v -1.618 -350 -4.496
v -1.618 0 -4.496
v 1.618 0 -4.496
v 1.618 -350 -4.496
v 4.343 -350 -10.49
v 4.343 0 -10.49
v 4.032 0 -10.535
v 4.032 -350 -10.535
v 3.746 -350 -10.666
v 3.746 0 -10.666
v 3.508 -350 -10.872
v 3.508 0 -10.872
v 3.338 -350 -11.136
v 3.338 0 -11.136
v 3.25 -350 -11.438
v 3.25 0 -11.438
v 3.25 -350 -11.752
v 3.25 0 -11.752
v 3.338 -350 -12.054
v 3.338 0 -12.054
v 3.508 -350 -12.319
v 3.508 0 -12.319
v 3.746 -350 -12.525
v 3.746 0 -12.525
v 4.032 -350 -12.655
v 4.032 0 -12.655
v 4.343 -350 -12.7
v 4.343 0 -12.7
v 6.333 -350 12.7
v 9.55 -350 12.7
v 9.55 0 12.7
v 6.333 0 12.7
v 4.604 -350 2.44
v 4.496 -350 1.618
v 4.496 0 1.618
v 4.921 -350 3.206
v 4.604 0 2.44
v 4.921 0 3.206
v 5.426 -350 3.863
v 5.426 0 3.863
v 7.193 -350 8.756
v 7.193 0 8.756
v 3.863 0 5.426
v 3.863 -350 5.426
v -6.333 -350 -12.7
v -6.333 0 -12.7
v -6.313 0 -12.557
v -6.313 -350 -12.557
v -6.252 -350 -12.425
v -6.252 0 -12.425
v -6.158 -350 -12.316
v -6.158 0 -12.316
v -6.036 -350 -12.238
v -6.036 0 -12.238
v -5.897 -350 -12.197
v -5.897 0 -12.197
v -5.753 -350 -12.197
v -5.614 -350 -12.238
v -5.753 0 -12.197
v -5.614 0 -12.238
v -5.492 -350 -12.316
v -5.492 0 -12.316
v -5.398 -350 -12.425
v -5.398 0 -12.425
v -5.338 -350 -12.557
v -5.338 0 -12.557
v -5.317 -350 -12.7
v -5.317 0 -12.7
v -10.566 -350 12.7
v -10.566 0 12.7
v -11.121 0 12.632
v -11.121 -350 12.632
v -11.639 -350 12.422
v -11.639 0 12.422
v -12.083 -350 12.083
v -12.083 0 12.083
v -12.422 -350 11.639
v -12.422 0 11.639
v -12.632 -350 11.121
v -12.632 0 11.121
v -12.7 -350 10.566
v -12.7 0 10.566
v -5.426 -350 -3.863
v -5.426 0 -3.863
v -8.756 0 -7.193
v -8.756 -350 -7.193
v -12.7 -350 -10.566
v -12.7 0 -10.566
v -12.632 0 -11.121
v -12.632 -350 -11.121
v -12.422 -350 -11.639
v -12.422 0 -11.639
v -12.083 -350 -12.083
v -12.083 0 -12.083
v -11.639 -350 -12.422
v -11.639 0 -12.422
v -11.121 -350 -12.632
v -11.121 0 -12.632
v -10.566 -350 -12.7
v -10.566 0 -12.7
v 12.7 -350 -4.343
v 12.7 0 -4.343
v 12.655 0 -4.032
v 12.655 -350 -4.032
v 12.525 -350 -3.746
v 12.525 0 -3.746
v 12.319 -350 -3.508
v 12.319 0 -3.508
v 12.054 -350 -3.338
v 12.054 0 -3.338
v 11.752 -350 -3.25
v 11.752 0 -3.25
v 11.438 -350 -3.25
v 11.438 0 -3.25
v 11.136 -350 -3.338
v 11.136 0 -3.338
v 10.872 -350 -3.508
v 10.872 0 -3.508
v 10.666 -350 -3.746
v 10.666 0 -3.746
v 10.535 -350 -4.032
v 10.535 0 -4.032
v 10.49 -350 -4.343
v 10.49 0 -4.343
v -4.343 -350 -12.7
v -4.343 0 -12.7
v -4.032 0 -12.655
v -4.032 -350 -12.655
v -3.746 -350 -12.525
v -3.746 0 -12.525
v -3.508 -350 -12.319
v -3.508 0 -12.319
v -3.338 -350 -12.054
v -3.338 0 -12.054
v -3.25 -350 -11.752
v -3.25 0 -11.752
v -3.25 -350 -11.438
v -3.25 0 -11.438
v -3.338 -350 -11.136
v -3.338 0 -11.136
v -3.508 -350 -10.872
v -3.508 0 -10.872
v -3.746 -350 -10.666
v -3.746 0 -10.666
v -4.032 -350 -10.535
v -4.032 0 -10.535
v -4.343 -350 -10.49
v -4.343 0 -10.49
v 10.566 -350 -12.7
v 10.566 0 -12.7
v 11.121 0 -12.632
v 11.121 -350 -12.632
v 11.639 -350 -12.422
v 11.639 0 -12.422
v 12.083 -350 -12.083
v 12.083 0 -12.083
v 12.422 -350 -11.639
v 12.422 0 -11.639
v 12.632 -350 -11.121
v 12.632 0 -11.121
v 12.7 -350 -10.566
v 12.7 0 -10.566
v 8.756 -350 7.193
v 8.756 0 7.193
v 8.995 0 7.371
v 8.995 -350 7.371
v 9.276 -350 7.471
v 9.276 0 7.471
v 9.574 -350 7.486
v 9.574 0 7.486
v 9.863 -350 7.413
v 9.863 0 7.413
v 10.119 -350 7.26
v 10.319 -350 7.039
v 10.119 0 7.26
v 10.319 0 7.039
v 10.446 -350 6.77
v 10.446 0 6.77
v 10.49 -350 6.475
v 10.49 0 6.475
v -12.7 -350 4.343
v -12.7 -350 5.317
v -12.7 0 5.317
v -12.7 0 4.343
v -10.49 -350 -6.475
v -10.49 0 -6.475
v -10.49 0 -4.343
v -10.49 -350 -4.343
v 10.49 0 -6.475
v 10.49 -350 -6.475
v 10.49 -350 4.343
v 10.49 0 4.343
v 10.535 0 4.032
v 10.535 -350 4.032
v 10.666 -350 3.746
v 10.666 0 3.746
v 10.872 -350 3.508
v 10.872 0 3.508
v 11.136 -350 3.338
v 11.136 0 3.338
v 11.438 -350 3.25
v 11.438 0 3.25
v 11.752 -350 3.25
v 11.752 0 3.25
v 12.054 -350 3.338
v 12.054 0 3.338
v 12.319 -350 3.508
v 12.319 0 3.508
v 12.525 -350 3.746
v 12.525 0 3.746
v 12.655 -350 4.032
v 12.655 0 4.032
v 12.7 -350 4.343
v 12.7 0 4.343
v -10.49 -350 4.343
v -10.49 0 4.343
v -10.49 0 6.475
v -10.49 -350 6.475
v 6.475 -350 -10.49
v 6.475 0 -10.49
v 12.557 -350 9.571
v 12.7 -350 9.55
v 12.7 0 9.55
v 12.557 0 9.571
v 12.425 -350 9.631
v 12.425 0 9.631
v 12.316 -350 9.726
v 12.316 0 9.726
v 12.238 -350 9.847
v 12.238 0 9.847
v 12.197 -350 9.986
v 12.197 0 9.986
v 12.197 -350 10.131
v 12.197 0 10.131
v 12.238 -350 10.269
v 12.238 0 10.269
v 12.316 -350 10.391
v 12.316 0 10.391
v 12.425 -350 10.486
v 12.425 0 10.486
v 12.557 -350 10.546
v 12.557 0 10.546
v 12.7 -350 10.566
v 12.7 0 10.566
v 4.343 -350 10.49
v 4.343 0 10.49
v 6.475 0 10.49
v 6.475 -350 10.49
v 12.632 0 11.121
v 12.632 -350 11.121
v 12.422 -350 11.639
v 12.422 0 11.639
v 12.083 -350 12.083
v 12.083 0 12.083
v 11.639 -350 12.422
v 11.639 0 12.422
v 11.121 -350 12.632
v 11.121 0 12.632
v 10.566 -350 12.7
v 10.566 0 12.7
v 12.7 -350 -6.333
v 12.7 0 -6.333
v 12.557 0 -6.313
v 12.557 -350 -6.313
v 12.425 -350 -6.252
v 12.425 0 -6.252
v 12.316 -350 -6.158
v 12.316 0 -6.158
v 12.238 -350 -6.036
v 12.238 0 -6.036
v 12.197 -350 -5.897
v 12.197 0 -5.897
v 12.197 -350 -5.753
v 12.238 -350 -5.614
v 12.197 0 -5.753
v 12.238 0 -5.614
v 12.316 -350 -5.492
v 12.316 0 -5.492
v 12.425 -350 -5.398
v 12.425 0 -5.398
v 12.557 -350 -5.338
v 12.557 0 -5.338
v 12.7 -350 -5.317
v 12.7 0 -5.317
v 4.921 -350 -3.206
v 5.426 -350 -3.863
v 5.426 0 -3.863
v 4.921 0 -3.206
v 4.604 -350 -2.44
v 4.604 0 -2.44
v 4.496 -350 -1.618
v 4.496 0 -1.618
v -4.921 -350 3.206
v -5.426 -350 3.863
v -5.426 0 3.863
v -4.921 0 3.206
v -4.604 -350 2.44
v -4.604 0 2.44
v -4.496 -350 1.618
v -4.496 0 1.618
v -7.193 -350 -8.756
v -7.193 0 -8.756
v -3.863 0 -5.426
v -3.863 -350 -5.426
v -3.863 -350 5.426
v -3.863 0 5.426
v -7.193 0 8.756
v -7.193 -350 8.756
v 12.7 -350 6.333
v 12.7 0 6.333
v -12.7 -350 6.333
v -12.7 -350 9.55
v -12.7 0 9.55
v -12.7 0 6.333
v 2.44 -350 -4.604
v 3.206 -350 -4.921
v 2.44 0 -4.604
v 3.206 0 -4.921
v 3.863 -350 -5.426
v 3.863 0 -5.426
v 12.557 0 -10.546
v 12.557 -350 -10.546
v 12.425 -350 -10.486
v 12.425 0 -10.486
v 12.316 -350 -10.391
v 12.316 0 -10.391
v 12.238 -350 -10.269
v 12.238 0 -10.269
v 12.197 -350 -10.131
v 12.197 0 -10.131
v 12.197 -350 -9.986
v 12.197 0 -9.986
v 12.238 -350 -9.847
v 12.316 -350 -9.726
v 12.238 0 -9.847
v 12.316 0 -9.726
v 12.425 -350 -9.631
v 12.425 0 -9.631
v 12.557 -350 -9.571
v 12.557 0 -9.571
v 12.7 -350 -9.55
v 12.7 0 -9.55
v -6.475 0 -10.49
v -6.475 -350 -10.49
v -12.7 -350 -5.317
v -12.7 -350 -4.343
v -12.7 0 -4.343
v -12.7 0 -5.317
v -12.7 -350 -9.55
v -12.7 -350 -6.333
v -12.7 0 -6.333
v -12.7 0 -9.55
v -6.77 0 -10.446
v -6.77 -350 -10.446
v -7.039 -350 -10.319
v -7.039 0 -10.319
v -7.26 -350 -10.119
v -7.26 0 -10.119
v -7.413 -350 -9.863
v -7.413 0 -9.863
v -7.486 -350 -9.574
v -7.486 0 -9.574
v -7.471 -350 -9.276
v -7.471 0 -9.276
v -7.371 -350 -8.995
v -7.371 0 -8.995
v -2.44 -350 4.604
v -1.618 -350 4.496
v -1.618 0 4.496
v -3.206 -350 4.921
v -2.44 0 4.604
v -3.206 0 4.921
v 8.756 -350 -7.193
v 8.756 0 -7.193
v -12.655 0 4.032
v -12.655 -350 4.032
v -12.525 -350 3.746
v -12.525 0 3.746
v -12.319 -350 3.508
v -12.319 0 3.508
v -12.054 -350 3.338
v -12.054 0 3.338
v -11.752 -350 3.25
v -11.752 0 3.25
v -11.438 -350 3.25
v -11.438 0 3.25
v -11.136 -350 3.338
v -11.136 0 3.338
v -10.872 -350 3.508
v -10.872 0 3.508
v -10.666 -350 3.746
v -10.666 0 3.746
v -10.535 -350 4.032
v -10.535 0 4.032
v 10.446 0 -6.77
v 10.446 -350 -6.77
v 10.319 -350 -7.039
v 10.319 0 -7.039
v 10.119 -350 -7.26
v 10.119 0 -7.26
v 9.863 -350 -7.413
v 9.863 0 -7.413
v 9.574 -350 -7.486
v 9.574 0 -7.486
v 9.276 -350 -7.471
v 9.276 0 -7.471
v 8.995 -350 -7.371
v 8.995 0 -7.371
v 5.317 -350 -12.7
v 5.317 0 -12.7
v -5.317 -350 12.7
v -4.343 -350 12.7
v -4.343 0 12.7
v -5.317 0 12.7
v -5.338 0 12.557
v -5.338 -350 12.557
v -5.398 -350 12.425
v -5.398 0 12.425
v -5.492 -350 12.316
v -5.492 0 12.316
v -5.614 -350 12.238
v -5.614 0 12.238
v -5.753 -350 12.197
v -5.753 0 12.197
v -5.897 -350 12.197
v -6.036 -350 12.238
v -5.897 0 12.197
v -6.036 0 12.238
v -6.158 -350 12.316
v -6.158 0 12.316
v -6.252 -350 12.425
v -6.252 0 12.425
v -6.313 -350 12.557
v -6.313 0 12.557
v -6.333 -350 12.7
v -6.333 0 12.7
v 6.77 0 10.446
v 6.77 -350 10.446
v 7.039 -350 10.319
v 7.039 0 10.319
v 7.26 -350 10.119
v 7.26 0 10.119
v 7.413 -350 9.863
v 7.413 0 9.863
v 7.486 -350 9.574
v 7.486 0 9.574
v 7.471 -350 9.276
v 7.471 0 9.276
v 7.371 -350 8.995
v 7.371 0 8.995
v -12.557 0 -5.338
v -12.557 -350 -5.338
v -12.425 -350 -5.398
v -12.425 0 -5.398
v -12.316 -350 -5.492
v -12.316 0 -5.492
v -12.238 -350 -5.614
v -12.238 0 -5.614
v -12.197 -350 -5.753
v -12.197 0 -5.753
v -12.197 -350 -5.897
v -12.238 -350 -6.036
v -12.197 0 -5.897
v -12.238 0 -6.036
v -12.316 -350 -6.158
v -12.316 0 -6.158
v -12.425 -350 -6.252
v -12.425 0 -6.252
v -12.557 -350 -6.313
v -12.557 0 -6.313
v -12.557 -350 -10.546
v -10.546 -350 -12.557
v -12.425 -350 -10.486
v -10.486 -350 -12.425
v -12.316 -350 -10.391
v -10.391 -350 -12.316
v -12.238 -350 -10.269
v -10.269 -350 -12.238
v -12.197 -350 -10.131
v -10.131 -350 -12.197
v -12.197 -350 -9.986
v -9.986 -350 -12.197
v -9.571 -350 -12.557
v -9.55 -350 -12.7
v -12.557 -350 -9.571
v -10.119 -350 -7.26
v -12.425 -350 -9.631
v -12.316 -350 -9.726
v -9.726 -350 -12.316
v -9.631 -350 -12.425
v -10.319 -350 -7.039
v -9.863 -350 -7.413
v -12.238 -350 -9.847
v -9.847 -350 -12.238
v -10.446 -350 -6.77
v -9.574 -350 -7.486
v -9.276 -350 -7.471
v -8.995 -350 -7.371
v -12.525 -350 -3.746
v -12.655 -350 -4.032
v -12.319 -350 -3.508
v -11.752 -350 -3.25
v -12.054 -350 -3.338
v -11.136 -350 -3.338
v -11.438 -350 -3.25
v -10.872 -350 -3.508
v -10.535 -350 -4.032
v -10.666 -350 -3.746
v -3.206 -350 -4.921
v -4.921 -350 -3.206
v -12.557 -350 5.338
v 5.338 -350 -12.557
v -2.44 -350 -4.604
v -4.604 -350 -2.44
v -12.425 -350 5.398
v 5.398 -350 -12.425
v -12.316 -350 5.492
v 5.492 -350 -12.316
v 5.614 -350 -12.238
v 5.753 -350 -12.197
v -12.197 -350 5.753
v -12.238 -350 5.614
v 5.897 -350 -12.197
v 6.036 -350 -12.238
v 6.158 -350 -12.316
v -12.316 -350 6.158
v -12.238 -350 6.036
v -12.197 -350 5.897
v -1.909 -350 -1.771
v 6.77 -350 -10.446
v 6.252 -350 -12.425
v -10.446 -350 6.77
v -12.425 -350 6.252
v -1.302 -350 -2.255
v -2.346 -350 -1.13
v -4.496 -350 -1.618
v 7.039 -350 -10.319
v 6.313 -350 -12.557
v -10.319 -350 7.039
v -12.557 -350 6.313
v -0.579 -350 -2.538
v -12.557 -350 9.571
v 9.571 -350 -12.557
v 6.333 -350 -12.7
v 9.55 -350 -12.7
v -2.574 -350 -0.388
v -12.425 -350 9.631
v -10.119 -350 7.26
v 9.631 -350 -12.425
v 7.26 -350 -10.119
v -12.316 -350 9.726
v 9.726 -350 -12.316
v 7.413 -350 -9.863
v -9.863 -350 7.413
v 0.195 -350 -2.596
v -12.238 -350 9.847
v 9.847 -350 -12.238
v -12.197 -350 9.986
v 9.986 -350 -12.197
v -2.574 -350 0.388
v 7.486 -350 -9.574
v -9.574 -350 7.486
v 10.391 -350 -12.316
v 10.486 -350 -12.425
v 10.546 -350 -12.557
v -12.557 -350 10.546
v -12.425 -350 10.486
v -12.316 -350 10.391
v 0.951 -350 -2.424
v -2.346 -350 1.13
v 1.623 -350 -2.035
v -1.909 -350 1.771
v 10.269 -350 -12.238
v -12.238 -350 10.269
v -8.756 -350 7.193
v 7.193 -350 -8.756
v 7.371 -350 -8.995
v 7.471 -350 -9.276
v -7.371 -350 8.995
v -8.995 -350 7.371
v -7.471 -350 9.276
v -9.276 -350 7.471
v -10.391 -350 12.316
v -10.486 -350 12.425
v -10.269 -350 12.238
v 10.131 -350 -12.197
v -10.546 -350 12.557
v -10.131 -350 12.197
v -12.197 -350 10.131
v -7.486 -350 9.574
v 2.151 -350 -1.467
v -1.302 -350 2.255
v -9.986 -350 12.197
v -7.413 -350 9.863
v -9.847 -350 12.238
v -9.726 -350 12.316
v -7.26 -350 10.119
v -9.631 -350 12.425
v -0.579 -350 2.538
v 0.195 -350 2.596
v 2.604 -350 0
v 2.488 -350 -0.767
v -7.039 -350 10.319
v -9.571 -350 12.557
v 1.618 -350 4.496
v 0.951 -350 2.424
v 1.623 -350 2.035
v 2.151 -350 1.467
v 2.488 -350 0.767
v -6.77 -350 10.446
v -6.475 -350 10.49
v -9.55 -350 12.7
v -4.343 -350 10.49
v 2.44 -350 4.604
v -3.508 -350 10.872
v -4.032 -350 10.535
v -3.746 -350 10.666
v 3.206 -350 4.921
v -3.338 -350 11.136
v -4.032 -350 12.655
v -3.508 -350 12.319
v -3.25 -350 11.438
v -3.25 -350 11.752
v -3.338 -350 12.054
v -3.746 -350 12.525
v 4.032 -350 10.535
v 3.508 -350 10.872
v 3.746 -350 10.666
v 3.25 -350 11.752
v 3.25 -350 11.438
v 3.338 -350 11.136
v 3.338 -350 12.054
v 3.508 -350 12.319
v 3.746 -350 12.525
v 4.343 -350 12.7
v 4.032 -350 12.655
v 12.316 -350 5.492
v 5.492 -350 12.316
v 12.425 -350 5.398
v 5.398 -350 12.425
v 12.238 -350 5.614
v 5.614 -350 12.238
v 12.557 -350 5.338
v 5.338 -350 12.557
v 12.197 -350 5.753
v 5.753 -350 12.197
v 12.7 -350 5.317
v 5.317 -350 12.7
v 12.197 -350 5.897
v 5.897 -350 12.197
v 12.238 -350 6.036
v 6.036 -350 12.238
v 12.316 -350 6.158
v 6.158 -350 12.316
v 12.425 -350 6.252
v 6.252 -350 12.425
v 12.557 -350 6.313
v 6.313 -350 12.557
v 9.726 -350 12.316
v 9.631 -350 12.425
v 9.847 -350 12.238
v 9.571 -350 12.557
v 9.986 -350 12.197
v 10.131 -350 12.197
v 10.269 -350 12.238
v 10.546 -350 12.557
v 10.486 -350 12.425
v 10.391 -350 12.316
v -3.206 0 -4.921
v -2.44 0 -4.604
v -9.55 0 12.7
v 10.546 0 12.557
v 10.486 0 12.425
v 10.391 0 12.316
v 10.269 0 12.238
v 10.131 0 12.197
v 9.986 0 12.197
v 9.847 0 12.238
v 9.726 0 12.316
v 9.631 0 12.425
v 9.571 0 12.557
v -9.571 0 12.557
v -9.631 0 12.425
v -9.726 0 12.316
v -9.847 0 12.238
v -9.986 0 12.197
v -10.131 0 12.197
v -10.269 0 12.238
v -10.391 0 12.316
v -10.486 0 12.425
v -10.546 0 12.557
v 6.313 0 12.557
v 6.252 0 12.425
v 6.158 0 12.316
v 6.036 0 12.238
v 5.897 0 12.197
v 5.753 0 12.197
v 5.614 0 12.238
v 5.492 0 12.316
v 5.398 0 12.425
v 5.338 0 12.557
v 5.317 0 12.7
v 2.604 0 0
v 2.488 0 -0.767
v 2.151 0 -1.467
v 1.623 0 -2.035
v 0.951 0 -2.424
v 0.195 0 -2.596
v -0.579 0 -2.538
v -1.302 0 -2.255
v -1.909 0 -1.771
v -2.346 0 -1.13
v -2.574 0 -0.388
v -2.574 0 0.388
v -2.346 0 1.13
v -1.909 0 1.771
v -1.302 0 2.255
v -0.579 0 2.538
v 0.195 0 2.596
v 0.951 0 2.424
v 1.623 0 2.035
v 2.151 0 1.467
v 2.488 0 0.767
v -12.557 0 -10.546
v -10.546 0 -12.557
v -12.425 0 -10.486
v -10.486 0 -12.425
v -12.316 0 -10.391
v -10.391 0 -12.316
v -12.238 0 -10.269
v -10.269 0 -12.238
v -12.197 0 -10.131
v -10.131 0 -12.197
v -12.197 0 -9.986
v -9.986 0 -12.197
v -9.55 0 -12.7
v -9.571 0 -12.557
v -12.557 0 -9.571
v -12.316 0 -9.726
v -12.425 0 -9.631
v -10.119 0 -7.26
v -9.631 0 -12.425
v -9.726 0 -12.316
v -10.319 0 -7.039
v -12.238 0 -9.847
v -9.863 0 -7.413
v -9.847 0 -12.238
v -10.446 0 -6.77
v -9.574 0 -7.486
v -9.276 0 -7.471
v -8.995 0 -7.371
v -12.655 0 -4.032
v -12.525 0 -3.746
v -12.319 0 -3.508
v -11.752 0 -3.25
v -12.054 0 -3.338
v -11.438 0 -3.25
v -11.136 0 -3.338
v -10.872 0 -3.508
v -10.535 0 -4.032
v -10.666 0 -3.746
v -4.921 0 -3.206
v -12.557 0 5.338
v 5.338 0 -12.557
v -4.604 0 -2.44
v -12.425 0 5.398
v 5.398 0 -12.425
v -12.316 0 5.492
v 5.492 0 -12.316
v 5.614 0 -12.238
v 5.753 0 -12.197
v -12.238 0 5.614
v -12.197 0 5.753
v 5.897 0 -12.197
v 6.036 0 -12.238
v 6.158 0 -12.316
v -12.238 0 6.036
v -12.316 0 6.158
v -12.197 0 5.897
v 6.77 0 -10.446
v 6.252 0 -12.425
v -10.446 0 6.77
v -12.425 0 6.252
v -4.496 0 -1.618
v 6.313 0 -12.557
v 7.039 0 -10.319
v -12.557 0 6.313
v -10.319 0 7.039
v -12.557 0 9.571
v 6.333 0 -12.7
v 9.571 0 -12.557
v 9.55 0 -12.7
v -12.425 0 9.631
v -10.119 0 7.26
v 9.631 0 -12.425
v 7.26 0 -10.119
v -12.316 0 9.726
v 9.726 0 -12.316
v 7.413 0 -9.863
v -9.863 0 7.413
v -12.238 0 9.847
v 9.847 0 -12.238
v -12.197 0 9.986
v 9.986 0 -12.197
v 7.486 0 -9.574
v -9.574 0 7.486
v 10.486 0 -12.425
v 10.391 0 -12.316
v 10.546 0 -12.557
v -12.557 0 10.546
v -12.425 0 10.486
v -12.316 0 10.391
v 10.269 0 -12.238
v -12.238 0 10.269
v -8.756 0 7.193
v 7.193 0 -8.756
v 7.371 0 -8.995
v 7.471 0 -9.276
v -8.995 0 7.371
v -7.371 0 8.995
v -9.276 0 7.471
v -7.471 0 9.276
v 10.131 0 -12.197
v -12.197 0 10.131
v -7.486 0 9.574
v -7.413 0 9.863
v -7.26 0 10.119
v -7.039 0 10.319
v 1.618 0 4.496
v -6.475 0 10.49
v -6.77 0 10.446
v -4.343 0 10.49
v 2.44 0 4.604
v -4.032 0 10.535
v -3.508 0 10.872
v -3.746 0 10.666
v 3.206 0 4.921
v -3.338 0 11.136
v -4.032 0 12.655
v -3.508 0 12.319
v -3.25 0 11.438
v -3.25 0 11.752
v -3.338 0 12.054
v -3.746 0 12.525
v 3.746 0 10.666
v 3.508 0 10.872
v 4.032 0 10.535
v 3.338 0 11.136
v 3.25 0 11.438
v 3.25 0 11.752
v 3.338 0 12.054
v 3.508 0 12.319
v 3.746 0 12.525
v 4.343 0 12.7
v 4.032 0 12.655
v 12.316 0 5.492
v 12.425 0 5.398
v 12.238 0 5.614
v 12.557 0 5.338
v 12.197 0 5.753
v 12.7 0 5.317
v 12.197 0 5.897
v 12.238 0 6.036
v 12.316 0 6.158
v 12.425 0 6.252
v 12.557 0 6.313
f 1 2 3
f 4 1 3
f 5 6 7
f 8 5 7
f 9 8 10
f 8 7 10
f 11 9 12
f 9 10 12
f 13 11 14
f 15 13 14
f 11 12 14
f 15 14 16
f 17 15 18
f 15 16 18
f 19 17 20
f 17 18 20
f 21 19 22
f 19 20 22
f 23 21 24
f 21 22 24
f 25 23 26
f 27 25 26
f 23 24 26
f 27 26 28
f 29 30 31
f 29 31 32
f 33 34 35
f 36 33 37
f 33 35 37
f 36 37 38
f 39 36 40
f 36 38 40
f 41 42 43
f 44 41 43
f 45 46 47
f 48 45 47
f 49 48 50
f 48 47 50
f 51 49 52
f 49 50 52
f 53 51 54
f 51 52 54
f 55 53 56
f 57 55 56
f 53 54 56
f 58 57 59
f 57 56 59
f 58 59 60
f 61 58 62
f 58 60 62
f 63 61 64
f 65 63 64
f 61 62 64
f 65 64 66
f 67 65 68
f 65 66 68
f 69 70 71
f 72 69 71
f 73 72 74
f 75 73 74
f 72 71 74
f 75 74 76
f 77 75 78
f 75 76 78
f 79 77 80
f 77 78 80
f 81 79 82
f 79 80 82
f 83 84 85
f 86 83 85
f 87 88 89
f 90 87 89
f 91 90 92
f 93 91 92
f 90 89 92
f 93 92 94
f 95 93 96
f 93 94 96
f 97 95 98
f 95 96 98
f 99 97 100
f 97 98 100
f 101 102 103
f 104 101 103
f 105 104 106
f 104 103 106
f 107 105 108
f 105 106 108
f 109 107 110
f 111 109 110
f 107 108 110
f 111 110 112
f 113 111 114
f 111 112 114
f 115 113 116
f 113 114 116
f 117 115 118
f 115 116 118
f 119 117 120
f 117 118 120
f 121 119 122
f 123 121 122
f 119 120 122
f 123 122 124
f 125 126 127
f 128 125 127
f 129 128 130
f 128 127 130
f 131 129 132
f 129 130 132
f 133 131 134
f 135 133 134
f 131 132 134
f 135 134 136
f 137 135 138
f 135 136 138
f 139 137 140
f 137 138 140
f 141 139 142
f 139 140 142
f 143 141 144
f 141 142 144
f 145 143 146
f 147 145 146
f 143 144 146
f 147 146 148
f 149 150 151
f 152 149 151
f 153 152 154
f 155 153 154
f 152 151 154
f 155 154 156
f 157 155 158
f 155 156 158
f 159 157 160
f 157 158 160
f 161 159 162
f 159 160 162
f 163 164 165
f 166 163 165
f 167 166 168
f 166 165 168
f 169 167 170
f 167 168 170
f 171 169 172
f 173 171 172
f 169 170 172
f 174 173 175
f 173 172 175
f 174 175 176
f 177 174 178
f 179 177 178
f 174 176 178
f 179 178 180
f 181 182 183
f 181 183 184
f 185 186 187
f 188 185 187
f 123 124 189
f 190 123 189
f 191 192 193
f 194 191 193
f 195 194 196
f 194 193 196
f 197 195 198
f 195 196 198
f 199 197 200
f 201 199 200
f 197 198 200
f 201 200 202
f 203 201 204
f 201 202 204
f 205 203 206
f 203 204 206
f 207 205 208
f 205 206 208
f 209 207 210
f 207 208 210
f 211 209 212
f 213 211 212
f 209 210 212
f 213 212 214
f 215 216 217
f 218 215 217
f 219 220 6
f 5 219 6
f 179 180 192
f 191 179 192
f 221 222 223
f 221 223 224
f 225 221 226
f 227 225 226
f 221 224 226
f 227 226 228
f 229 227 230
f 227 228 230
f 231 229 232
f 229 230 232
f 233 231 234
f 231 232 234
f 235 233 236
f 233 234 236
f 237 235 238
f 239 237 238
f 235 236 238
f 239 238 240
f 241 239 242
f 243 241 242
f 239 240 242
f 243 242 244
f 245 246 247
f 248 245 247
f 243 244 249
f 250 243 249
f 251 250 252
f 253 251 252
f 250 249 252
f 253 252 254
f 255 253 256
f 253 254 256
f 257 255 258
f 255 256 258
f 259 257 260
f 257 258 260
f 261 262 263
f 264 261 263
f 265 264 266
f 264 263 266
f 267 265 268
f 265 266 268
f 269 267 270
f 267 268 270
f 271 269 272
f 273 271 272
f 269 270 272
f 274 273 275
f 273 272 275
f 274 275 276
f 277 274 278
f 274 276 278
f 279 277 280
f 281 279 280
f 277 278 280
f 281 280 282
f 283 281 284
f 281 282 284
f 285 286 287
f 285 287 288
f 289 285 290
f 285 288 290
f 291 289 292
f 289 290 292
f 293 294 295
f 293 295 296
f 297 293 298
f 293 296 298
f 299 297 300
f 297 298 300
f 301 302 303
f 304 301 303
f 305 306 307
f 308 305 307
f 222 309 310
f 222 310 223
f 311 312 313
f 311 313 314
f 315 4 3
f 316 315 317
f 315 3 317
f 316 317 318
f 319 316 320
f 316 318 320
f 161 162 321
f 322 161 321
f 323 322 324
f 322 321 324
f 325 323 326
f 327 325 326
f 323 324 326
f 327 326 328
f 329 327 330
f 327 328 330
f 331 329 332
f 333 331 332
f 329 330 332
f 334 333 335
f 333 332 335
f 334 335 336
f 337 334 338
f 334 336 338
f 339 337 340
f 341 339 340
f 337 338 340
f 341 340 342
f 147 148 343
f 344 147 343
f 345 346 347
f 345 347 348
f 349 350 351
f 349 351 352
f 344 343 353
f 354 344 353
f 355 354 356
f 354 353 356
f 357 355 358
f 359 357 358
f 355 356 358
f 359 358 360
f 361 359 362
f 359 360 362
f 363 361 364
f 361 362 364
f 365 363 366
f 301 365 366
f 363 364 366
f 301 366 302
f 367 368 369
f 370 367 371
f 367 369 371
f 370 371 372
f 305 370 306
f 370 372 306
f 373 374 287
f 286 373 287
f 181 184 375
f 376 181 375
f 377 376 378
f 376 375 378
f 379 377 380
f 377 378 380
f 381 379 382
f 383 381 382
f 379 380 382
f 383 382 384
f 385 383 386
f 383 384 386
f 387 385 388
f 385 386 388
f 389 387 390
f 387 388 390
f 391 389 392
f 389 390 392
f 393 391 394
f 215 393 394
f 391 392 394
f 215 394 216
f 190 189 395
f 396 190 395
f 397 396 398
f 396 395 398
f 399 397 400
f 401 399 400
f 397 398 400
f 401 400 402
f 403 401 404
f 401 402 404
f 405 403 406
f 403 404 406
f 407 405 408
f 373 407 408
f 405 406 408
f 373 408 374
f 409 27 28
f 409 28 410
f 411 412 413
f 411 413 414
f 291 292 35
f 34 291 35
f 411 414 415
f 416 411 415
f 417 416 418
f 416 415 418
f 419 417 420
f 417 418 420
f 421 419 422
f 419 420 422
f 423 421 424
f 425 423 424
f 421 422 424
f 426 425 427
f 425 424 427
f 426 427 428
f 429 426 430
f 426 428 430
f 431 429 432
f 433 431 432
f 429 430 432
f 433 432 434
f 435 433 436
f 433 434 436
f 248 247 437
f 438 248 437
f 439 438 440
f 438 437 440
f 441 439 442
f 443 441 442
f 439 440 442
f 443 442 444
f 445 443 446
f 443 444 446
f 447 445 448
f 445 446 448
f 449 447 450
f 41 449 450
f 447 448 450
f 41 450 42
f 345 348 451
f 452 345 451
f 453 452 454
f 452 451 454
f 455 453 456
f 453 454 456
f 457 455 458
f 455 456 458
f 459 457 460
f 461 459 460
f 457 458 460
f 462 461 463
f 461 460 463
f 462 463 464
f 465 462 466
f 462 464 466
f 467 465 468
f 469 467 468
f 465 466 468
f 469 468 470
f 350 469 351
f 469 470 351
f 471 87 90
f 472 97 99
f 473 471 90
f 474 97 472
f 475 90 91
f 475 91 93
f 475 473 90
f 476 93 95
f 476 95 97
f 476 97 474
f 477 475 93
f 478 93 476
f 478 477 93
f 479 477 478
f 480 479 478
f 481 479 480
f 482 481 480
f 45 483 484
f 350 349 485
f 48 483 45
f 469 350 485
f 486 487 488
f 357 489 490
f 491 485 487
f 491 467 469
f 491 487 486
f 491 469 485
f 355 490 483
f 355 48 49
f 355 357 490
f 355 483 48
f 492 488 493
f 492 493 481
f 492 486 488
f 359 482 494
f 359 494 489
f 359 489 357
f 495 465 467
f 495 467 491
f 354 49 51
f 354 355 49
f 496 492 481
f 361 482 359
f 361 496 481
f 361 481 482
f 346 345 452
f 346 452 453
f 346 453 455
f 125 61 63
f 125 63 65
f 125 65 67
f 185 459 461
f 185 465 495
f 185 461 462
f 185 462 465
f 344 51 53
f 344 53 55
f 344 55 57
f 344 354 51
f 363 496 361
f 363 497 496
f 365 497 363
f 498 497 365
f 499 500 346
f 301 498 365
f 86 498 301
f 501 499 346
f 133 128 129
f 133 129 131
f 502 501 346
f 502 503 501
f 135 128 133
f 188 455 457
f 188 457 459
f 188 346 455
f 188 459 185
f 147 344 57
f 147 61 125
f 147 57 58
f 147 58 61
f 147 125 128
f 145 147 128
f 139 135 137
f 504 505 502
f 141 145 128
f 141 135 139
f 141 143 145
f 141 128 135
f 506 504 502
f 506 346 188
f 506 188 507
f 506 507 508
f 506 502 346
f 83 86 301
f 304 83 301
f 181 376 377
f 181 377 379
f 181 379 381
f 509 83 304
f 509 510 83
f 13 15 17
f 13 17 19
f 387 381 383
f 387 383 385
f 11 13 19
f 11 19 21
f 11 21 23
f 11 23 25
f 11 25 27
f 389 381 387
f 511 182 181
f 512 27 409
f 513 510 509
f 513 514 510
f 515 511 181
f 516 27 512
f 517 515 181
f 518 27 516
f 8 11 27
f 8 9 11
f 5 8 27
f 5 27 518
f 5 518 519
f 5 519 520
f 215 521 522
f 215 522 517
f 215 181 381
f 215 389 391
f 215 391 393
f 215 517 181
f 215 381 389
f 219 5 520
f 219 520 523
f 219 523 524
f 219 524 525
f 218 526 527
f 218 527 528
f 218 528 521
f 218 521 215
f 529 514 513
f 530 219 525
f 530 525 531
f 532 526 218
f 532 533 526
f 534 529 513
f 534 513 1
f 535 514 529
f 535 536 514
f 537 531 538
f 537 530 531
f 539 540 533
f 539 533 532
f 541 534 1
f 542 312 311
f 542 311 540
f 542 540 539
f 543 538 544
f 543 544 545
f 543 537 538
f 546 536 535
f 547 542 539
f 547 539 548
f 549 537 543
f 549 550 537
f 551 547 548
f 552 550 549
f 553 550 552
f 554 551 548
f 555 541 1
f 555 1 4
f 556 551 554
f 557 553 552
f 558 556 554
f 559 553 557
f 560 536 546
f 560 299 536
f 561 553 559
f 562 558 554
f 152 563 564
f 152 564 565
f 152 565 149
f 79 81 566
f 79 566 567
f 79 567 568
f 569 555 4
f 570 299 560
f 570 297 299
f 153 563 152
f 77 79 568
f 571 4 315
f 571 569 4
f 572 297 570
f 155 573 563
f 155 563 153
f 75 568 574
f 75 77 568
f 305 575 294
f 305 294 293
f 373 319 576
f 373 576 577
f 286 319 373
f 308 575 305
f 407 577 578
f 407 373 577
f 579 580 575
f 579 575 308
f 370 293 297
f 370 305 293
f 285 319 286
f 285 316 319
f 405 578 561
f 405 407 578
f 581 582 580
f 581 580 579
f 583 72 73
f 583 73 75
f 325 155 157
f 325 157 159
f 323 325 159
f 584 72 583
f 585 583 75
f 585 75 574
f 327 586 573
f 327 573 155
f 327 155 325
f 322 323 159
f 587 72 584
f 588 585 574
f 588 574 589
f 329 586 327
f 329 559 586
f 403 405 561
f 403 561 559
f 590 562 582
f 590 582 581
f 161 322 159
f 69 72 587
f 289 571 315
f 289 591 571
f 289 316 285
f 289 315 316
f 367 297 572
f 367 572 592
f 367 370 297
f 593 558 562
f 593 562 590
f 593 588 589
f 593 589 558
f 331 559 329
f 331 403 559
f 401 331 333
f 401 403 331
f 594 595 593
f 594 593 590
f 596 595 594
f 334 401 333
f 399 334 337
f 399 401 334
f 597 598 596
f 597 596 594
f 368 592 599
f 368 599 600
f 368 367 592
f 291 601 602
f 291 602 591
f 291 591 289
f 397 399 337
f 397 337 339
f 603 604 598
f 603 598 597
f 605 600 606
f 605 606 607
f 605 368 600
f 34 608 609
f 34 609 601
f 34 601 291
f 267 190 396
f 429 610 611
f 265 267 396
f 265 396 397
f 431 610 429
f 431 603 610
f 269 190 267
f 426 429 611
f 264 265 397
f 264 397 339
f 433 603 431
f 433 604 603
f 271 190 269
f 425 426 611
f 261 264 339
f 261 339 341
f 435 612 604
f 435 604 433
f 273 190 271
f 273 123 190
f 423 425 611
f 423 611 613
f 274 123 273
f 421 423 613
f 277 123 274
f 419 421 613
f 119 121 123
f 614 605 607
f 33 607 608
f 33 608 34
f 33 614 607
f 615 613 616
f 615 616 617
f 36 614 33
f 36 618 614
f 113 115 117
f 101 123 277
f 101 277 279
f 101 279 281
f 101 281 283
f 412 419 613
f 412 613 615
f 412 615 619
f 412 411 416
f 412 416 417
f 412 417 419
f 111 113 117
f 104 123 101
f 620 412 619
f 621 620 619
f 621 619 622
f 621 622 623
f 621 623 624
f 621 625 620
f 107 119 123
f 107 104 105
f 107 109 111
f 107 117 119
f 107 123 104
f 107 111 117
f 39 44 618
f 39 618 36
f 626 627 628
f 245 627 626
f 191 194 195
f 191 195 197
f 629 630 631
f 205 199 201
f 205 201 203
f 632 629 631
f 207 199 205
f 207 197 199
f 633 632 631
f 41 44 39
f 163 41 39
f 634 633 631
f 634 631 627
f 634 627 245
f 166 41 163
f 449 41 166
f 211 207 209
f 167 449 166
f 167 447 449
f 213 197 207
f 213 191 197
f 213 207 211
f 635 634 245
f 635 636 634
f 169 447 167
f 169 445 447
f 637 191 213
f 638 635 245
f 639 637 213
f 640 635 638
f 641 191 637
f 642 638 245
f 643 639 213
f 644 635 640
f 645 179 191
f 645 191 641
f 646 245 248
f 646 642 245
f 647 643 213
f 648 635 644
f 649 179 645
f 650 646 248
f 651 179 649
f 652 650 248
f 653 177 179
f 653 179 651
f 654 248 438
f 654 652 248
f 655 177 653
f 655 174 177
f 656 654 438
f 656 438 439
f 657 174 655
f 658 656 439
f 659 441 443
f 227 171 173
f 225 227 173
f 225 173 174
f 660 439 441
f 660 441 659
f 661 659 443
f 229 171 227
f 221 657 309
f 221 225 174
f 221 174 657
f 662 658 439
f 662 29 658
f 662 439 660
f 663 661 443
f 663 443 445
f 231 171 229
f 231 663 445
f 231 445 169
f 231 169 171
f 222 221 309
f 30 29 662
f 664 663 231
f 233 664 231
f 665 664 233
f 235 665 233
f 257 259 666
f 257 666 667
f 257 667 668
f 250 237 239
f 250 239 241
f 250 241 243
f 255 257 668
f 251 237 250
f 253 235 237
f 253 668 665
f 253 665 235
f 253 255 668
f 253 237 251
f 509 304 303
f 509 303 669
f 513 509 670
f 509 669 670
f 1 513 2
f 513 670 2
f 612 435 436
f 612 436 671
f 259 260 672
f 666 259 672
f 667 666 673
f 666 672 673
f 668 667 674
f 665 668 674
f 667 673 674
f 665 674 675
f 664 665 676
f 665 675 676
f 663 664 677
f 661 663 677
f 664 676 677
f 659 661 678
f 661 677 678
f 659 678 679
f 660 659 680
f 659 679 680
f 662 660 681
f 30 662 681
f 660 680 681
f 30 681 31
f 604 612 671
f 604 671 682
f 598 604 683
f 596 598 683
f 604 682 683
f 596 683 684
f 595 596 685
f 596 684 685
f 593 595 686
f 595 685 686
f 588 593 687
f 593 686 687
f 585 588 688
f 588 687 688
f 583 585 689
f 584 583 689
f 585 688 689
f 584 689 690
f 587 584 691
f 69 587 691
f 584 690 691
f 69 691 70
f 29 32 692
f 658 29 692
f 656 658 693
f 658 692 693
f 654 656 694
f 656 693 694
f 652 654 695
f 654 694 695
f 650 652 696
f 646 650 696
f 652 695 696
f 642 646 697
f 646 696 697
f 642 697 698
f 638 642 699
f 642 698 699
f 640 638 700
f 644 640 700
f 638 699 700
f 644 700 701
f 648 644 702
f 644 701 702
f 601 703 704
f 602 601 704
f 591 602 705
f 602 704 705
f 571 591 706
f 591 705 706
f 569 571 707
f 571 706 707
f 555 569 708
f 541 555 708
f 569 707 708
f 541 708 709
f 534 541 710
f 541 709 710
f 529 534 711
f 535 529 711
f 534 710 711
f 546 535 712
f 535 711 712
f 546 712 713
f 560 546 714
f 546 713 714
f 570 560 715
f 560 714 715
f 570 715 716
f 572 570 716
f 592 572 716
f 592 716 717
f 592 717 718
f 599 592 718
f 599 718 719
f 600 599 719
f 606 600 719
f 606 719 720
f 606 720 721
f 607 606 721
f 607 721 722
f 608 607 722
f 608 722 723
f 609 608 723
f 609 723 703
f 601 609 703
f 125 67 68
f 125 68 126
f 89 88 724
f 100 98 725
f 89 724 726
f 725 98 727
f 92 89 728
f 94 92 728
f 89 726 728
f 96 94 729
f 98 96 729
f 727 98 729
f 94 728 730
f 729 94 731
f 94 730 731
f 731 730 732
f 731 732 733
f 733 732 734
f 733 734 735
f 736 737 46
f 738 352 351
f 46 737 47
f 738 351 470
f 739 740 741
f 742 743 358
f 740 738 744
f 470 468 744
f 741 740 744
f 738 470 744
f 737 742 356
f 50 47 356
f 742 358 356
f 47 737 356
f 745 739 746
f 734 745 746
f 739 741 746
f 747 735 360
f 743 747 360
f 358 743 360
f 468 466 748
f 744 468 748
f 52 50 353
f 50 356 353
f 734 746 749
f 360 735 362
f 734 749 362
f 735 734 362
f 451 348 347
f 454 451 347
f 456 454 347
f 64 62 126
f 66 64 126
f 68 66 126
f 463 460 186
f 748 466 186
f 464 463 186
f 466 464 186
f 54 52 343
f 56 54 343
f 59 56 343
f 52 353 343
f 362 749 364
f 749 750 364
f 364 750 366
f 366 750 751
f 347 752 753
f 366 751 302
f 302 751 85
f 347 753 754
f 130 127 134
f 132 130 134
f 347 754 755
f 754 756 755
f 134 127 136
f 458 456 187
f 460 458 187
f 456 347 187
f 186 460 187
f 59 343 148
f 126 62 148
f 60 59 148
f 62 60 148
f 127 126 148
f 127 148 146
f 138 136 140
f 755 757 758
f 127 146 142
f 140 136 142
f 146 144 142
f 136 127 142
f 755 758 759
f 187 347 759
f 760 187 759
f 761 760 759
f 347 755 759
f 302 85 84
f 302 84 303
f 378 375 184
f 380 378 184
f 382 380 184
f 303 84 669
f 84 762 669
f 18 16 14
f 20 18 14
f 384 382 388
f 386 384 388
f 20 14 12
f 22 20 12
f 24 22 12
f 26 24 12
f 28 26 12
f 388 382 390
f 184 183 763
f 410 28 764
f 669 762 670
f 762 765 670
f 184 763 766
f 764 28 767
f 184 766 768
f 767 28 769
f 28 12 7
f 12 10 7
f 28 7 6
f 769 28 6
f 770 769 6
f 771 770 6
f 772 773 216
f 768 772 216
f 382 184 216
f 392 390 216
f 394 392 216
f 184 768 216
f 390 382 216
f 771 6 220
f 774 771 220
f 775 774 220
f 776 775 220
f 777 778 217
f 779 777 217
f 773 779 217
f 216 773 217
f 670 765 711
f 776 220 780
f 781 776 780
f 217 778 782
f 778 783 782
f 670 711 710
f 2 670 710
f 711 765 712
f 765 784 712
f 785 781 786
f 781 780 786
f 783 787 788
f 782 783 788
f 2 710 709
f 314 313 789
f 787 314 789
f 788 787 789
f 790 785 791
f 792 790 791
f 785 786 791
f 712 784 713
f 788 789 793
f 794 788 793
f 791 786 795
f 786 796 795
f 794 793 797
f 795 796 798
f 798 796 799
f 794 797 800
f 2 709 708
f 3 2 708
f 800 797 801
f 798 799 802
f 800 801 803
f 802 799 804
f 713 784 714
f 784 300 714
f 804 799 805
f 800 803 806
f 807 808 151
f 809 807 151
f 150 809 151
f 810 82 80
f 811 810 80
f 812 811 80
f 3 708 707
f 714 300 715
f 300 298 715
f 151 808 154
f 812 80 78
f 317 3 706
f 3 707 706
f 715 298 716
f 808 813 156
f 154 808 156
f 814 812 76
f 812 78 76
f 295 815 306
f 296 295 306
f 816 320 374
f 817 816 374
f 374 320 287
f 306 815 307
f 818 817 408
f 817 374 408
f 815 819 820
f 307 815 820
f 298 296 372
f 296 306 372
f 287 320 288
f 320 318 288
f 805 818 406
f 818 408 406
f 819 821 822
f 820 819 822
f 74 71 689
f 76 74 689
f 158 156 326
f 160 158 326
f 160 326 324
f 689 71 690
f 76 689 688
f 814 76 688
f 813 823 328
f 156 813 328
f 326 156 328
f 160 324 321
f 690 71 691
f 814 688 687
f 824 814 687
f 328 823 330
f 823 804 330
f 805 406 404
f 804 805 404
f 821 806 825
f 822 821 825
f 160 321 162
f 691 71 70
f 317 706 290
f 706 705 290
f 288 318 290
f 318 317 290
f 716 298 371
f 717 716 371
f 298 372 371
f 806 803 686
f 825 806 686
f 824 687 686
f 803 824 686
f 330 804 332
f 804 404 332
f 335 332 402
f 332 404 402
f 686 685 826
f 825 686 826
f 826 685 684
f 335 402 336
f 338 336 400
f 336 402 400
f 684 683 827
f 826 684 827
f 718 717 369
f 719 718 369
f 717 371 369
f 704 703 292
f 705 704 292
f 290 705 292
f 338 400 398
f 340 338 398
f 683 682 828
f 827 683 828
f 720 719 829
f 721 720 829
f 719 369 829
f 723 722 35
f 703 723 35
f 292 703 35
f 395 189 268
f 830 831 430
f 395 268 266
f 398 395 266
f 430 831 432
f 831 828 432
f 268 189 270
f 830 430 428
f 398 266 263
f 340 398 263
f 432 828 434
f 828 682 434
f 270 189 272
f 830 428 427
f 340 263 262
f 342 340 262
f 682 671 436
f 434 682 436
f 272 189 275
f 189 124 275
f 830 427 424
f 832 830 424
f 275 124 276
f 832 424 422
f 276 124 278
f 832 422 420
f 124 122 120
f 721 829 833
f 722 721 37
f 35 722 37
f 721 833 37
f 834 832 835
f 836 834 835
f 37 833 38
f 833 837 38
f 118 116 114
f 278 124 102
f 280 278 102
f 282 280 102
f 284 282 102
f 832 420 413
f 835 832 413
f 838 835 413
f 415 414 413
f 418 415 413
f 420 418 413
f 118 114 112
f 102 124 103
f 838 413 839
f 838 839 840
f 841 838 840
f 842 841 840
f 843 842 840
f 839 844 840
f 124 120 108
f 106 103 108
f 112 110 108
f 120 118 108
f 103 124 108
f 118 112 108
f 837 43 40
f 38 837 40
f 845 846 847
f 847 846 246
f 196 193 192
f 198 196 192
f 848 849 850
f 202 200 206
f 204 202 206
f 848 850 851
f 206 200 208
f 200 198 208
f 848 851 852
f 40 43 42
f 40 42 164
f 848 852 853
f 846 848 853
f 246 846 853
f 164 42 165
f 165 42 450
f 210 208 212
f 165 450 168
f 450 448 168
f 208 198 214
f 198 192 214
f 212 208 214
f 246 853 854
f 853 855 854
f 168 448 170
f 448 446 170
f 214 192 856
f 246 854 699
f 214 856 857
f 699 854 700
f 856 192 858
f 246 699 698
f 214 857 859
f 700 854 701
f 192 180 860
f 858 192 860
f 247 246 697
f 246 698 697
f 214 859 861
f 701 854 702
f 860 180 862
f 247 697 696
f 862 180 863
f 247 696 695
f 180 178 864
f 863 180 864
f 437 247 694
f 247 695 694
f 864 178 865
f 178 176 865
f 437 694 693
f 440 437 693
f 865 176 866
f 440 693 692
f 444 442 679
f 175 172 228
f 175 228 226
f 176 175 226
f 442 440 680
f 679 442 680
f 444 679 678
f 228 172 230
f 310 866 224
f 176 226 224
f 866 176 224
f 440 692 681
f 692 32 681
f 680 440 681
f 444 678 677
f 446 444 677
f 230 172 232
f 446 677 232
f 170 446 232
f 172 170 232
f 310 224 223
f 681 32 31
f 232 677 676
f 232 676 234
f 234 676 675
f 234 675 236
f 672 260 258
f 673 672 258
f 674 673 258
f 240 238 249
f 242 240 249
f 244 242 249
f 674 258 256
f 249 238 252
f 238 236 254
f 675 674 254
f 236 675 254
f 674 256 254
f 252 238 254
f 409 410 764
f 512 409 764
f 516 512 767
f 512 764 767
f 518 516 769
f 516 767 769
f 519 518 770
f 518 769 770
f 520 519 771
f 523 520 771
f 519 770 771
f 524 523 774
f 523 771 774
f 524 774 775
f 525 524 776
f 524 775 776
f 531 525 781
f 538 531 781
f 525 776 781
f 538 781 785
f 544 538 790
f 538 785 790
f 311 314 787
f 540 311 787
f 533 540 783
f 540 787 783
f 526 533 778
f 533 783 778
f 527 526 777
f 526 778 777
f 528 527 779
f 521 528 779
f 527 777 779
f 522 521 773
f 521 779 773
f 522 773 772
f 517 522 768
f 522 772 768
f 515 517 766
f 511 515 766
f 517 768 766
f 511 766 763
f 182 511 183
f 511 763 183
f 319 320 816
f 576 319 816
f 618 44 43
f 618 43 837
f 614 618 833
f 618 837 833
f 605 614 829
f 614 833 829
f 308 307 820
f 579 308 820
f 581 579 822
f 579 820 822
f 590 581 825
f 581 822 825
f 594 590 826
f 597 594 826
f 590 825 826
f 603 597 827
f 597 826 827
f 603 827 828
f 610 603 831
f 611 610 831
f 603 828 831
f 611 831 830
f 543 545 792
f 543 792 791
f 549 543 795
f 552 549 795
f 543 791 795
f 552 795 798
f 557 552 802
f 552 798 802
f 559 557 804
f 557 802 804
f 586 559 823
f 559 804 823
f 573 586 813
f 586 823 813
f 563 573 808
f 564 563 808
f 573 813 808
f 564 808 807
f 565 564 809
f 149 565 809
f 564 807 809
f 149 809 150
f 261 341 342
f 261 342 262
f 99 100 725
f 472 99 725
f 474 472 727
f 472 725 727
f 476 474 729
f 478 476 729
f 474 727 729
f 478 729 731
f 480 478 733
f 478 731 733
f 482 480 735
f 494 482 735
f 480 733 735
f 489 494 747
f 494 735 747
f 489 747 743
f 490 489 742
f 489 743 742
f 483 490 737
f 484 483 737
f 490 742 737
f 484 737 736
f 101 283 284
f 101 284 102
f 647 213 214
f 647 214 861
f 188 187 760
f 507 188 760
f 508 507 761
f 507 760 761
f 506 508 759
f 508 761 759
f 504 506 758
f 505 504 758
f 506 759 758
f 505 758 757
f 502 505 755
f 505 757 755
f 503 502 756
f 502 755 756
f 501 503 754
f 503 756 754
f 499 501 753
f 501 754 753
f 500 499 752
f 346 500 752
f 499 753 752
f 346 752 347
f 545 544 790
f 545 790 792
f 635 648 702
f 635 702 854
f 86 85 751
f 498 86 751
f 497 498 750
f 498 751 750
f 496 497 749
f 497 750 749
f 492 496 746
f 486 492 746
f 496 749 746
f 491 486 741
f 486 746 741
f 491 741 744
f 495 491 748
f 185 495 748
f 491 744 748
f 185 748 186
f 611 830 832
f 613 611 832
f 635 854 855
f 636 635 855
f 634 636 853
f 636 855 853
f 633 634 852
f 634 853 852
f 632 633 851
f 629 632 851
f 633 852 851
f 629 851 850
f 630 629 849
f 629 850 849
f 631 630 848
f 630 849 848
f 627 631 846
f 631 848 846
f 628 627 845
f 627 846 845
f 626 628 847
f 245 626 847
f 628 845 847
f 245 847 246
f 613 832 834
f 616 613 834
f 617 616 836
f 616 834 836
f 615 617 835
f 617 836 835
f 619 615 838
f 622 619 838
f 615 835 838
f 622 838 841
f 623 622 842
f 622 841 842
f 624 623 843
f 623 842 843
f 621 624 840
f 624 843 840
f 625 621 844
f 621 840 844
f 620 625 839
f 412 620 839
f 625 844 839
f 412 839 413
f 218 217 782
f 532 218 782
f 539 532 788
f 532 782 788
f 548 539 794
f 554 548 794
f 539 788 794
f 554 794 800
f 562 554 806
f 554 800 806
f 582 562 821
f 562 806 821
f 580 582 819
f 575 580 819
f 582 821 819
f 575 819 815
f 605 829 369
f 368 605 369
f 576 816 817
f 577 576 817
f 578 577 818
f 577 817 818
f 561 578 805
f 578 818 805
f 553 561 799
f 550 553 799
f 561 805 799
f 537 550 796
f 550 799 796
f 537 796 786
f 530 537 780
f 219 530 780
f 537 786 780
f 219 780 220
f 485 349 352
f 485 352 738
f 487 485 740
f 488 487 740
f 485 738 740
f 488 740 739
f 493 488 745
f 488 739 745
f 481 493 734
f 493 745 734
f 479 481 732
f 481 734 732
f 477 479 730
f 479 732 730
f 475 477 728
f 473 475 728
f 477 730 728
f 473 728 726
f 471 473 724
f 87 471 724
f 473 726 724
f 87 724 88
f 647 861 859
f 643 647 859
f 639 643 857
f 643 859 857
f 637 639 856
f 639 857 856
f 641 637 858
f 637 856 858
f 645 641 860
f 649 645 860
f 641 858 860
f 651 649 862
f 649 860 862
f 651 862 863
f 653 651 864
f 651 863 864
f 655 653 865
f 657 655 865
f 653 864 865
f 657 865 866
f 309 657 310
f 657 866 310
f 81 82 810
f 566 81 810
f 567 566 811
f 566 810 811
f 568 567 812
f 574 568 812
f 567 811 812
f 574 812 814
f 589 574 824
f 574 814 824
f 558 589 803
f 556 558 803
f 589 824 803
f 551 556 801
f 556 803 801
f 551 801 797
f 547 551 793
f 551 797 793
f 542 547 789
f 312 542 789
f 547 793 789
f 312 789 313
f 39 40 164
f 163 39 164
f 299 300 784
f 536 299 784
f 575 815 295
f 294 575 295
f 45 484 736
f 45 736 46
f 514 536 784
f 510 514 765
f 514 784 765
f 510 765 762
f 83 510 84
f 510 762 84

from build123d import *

# Parameters (mm, degrees)
F1_DEPTH = 375
F2_DEPTH = 25


# Not quite as in the source:
# - ends of sketch curves that miss each other by under 0.0002 mm in the source are joined


with BuildPart() as f1:
    # F0 (on Front) → F1 (new body)
    with BuildSketch(Plane.XZ):
        with BuildLine():
            ThreePointArc((-12.7, -9.5504), (-12.1920000057, -10.0583238), (-12.6998476, -10.5663999771))
            ThreePointArc((-12.6998476, -10.5663999771), (-12.0825225161, -12.0825225161), (-10.5664000074, -12.6998469825))
            ThreePointArc((-10.5664000074, -12.6998469825), (-10.0583238, -12.1920000057), (-9.5504, -12.7))
            Line((-9.5504, -12.7), (-6.3330836, -12.7))
            ThreePointArc((-6.3330836, -12.7), (-5.8250836, -12.192), (-5.3170836, -12.7))
            Line((-5.3170836, -12.7), (-4.3434, -12.7))
            ThreePointArc((-4.3434, -12.7), (-3.2385, -11.5951), (-4.3434, -10.4902))
            Line((-4.3434, -10.4902), (-6.4747902, -10.4902))
            ThreePointArc((-6.4747902, -10.4902), (-7.413451805, -9.8630063673), (-7.1932106897, -8.7557795103))
            Line((-7.1932106897, -8.7557795103), (-3.8631622, -5.4257448))
            ThreePointArc((-3.8631622, -5.4257448), (-2.8331268978, -4.7374824843), (-1.618107, -4.4958))
            Line((-1.618107, -4.4958), (1.618107, -4.4958))
            ThreePointArc((1.618107, -4.4958), (2.8331268978, -4.7374824843), (3.8631710303, -5.4257359697))
            Line((3.8631710303, -5.4257359697), (7.1932038, -8.7557864))
            ThreePointArc((7.1932038, -8.7557864), (7.413451805, -9.8630063673), (6.4747902, -10.4902))
            Line((6.4747902, -10.4902), (4.3434, -10.4902))
            ThreePointArc((4.3434, -10.4902), (3.2385, -11.5951), (4.3434, -12.7))
            Line((4.3434, -12.7), (5.3170836, -12.7))
            ThreePointArc((5.3170836, -12.7), (5.8250836, -12.192), (6.3330836, -12.7))
            Line((6.3330836, -12.7), (9.5504, -12.7))
            ThreePointArc((9.5504, -12.7), (10.0583238, -12.1920000057), (10.5663999771, -12.6998476))
            ThreePointArc((10.5663999771, -12.6998476), (12.0825225161, -12.0825225161), (12.6998469825, -10.5664000074))
            ThreePointArc((12.6998469825, -10.5664000074), (12.1920000057, -10.0583238), (12.7, -9.5504))
            Line((12.7, -9.5504), (12.7, -6.3330836))
            ThreePointArc((12.7, -6.3330836), (12.192, -5.8250836), (12.7, -5.3170836))
            Line((12.7, -5.3170836), (12.7, -4.3434))
            ThreePointArc((12.7, -4.3434), (11.5951, -3.2385), (10.4902, -4.3434))
            Line((10.4902, -4.3434), (10.4902, -6.4747902))
            ThreePointArc((10.4902, -6.4747902), (9.8630063673, -7.413451805), (8.7557795103, -7.1932106897))
            Line((8.7557795103, -7.1932106897), (5.4257448, -3.8631622))
            ThreePointArc((5.4257448, -3.8631622), (4.7374824843, -2.8331268978), (4.4958, -1.618107))
            Line((4.4958, -1.618107), (4.4958, 1.618107))
            ThreePointArc((4.4958, 1.618107), (4.7374824843, 2.8331268978), (5.4257359697, 3.8631710303))
            Line((5.4257359697, 3.8631710303), (8.7557864, 7.1932038))
            ThreePointArc((8.7557864, 7.1932038), (9.8630063673, 7.413451805), (10.4902, 6.4747902))
            Line((10.4902, 6.4747902), (10.4902, 4.3434))
            ThreePointArc((10.4902, 4.3434), (11.5951, 3.2385), (12.7, 4.3434))
            Line((12.7, 4.3434), (12.7, 5.3170836))
            ThreePointArc((12.7, 5.3170836), (12.192, 5.8250836), (12.7, 6.3330836))
            Line((12.7, 6.3330836), (12.7, 9.5504))
            ThreePointArc((12.7, 9.5504), (12.1920000057, 10.0583238), (12.6998476, 10.5663999771))
            ThreePointArc((12.6998476, 10.5663999771), (12.0825225161, 12.0825225161), (10.5664000074, 12.6998469825))
            ThreePointArc((10.5664000074, 12.6998469825), (10.0583238, 12.1920000057), (9.5504, 12.7))
            Line((9.5504, 12.7), (6.3330836, 12.7))
            ThreePointArc((6.3330836, 12.7), (5.8250836, 12.192), (5.3170836, 12.7))
            Line((5.3170836, 12.7), (4.3434, 12.7))
            ThreePointArc((4.3434, 12.7), (3.2385, 11.5951), (4.3434, 10.4902))
            Line((4.3434, 10.4902), (6.4747902, 10.4902))
            ThreePointArc((6.4747902, 10.4902), (7.413451805, 9.8630063673), (7.1932106897, 8.7557795103))
            Line((7.1932106897, 8.7557795103), (3.8631622, 5.4257448))
            ThreePointArc((3.8631622, 5.4257448), (2.8331268978, 4.7374824843), (1.618107, 4.4958))
            Line((1.618107, 4.4958), (-1.618107, 4.4958))
            ThreePointArc((-1.618107, 4.4958), (-2.8331268978, 4.7374824843), (-3.8631710303, 5.4257359697))
            Line((-3.8631710303, 5.4257359697), (-7.1932038, 8.7557864))
            ThreePointArc((-7.1932038, 8.7557864), (-7.413451805, 9.8630063673), (-6.4747902, 10.4902))
            Line((-6.4747902, 10.4902), (-4.3434, 10.4902))
            ThreePointArc((-4.3434, 10.4902), (-3.2385, 11.5951), (-4.3434, 12.7))
            Line((-4.3434, 12.7), (-5.3170836, 12.7))
            ThreePointArc((-5.3170836, 12.7), (-5.8250836, 12.192), (-6.3330836, 12.7))
            Line((-6.3330836, 12.7), (-9.5504, 12.7))
            ThreePointArc((-9.5504, 12.7), (-10.0583238, 12.1920000057), (-10.5663999771, 12.6998476))
            ThreePointArc((-10.5663999771, 12.6998476), (-12.0825225161, 12.0825225161), (-12.6998469825, 10.5664000074))
            ThreePointArc((-12.6998469825, 10.5664000074), (-12.1920000057, 10.0583238), (-12.7, 9.5504))
            Line((-12.7, 9.5504), (-12.7, 6.3330836))
            ThreePointArc((-12.7, 6.3330836), (-12.192, 5.8250836), (-12.7, 5.3170836))
            Line((-12.7, 5.3170836), (-12.7, 4.3434))
            ThreePointArc((-12.7, 4.3434), (-11.5951, 3.2385), (-10.4902, 4.3434))
            Line((-10.4902, 4.3434), (-10.4902, 6.4747902))
            ThreePointArc((-10.4902, 6.4747902), (-9.8630063673, 7.413451805), (-8.7557795103, 7.1932106897))
            Line((-8.7557795103, 7.1932106897), (-5.4257448, 3.8631622))
            ThreePointArc((-5.4257448, 3.8631622), (-4.7374824843, 2.8331268978), (-4.4958, 1.618107))
            Line((-4.4958, 1.618107), (-4.4958, -1.618107))
            ThreePointArc((-4.4958, -1.618107), (-4.7374824843, -2.8331268978), (-5.4257359697, -3.8631710303))
            Line((-5.4257359697, -3.8631710303), (-8.7557864, -7.1932038))
            ThreePointArc((-8.7557864, -7.1932038), (-9.8630063673, -7.413451805), (-10.4902, -6.4747902))
            Line((-10.4902, -6.4747902), (-10.4902, -4.3434))
            ThreePointArc((-10.4902, -4.3434), (-11.5951, -3.2385), (-12.7, -4.3434))
            Line((-12.7, -4.3434), (-12.7, -5.3170836))
            ThreePointArc((-12.7, -5.3170836), (-12.192, -5.8250836), (-12.7, -6.3330836))
            Line((-12.7, -6.3330836), (-12.7, -9.5504))
        make_face()
        with BuildLine():
            ThreePointArc((-2.6035, 0), (0, 2.6035), (2.6035, 0))
            ThreePointArc((2.6035, 0), (0, -2.6035), (-2.6035, 0))
        make_face(mode=Mode.SUBTRACT)
    extrude(amount=F1_DEPTH)

    # F2 (cut): a face of the model
    f2_faces = [f1.faces().sort_by_distance(p)[0] for p in [
        (-10.849410262, -375, 5.4090951),
    ]]
    extrude(f2_faces, amount=-F2_DEPTH, mode=Mode.SUBTRACT)


solid = f1.part
